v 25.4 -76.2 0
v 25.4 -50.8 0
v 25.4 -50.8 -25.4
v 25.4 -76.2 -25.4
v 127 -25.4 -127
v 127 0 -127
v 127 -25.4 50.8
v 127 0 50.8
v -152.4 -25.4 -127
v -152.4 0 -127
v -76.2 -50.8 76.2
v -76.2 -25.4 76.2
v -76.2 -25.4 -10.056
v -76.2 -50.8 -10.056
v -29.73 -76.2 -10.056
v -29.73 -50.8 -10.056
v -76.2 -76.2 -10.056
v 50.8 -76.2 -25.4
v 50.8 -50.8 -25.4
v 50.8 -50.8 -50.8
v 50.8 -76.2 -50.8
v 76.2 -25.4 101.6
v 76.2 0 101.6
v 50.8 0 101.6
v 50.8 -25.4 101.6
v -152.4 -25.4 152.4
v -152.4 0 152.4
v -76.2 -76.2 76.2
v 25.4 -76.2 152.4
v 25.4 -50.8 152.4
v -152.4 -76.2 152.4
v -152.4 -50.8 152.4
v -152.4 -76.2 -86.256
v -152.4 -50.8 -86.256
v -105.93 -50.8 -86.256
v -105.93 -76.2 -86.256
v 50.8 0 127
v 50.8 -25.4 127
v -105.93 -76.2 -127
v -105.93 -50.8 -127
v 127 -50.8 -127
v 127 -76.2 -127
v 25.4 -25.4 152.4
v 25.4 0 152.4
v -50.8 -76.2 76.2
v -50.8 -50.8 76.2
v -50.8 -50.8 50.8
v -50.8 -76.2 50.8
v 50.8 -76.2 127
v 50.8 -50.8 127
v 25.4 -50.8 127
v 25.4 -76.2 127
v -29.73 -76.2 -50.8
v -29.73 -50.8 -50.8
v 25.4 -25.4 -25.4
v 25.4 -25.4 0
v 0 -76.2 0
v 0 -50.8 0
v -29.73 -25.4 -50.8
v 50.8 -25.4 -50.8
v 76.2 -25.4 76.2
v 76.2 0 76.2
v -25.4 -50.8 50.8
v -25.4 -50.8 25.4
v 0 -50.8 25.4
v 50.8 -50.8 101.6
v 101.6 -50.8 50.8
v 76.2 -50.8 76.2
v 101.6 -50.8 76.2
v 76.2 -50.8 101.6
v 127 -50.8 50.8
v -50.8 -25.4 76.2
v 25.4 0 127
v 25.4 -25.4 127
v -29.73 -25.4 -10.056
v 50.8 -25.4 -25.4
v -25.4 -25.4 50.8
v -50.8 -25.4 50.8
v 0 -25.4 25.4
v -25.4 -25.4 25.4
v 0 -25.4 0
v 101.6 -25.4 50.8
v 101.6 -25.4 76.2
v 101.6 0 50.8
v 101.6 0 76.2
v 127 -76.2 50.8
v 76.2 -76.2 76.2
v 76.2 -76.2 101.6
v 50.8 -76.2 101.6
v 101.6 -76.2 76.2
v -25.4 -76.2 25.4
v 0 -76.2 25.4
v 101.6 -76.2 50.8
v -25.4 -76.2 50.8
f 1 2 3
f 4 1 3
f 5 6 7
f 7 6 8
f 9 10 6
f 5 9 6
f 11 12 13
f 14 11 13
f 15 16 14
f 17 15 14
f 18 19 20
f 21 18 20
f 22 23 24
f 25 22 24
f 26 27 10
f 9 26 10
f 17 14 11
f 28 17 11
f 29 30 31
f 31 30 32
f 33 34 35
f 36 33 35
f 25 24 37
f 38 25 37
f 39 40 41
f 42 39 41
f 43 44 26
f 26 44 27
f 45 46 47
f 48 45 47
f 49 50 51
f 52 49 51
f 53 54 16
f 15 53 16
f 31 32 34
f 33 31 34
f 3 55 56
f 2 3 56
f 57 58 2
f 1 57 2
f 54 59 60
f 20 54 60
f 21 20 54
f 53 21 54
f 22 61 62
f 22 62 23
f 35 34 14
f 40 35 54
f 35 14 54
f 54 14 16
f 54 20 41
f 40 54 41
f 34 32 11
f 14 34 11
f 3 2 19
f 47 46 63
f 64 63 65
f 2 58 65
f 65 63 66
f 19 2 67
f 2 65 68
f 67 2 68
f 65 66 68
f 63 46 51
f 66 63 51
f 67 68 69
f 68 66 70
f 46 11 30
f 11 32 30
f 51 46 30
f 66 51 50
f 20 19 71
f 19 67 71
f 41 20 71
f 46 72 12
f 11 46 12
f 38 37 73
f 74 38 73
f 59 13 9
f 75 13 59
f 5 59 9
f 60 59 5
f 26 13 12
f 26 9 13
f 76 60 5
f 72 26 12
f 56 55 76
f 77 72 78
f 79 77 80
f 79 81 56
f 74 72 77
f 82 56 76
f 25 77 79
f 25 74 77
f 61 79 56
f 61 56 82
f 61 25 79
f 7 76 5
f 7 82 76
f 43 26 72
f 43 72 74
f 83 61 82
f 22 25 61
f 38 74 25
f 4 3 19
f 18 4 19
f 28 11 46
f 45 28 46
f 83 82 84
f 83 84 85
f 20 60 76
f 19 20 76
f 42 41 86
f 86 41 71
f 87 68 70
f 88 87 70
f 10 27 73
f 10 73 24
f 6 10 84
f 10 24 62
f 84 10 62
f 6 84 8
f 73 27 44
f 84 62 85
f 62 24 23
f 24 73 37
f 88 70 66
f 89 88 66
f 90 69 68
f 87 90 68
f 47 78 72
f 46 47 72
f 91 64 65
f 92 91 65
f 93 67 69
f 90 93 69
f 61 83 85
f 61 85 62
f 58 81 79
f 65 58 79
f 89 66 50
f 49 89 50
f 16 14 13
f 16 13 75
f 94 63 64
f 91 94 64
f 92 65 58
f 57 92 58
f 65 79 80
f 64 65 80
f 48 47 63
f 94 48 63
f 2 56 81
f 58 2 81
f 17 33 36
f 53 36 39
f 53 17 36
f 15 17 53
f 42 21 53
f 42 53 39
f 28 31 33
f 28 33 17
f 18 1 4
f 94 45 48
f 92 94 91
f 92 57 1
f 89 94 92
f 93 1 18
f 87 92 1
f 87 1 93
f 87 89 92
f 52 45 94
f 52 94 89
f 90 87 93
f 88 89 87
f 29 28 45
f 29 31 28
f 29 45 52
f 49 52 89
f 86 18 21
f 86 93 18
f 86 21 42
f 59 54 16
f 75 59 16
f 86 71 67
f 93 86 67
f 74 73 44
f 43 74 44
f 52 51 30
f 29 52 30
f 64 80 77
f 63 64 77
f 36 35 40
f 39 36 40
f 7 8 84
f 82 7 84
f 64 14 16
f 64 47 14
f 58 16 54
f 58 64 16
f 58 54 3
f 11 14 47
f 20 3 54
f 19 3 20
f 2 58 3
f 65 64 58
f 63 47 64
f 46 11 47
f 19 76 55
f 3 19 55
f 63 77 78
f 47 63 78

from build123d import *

# Parameters (mm, degrees)
F1_DEPTH = 50.8
F2_W     = 46.4695086598
F2_H     = 40.7440985173
F3_DEPTH = 25.4
F5_DEPTH = 25.4
F7_DEPTH = 25.4


with BuildPart() as f1:
    # F0 (on Front) → F1 (new body)
    with BuildSketch(Plane.XZ):
        Polygon((-50.8, 76.2), (-76.2, 76.2), (-76.2, -50.8), (50.8, -50.8), (50.8, -25.4), (25.4, -25.4), (25.4, 0), (0, 0), (0, 25.4), (-25.4, 25.4), (-25.4, 50.8), (-50.8, 50.8), (-50.8, 67.4914264514), align=None)
    extrude(amount=F1_DEPTH)

    # F2 (on face) → F3 (cut)
    with BuildSketch(Plane.XZ.offset(50.8)):
        with Locations((-52.9652456701, -30.4279507414)):
            Rectangle(F2_W, F2_H)
    extrude(amount=-F3_DEPTH, mode=Mode.SUBTRACT)

    # F4 (on face) → F5 (join)
    with BuildSketch(Plane.XZ):
        Polygon((76.2, 101.6), (50.8, 101.6), (50.8, 127), (25.4, 127), (25.4, 152.4), (-152.4, 152.4), (-152.4, -127), (127, -127), (127, 50.8), (101.6, 50.8), (101.6, 76.2), (76.2, 76.2), align=None)
        Polygon((-76.2, 76.2), (-50.8, 76.2), (-50.8, 67.4914264514), (-50.8, 50.8), (-25.4, 50.8), (-25.4, 25.4), (0, 25.4), (0, 0), (25.4, 0), (25.4, -25.4), (50.8, -25.4), (50.8, -50.8), (-76.2, -50.8), align=None, mode=Mode.SUBTRACT)
        Polygon((76.2, 101.6), (50.8, 101.6), (50.8, 127), (25.4, 127), (25.4, 152.4), (-152.4, 152.4), (-152.4, -127), (127, -127), (127, 50.8), (101.6, 50.8), (101.6, 76.2), (76.2, 76.2), align=None)
    extrude(amount=F5_DEPTH)


with BuildPart() as f7:
    # F6 (on face) → F7 (new body)
    with BuildSketch(Plane.XZ.offset(50.8)):
        Polygon((25.4, 152.4), (-152.4, 152.4), (-152.4, -86.2559014827), (-105.9304913402, -86.2559014827), (-105.9304913402, -127), (127, -127), (127, 50.8), (101.6, 50.8), (101.6, 76.2), (76.2, 76.2), (76.2, 101.6), (50.8, 101.6), (50.8, 127), (25.4, 127), align=None)
        Polygon((-50.8, 76.2), (-50.8, 50.8), (-25.4, 50.8), (-25.4, 25.4), (0, 25.4), (0, 0), (25.4, 0), (25.4, -25.4), (50.8, -25.4), (50.8, -50.8), (-29.7304913402, -50.8), (-29.7304913402, -10.0559014827), (-76.2, -10.0559014827), (-76.2, 76.2), align=None, mode=Mode.SUBTRACT)
    extrude(amount=F7_DEPTH)


solid = Compound([f1.part, f7.part])
